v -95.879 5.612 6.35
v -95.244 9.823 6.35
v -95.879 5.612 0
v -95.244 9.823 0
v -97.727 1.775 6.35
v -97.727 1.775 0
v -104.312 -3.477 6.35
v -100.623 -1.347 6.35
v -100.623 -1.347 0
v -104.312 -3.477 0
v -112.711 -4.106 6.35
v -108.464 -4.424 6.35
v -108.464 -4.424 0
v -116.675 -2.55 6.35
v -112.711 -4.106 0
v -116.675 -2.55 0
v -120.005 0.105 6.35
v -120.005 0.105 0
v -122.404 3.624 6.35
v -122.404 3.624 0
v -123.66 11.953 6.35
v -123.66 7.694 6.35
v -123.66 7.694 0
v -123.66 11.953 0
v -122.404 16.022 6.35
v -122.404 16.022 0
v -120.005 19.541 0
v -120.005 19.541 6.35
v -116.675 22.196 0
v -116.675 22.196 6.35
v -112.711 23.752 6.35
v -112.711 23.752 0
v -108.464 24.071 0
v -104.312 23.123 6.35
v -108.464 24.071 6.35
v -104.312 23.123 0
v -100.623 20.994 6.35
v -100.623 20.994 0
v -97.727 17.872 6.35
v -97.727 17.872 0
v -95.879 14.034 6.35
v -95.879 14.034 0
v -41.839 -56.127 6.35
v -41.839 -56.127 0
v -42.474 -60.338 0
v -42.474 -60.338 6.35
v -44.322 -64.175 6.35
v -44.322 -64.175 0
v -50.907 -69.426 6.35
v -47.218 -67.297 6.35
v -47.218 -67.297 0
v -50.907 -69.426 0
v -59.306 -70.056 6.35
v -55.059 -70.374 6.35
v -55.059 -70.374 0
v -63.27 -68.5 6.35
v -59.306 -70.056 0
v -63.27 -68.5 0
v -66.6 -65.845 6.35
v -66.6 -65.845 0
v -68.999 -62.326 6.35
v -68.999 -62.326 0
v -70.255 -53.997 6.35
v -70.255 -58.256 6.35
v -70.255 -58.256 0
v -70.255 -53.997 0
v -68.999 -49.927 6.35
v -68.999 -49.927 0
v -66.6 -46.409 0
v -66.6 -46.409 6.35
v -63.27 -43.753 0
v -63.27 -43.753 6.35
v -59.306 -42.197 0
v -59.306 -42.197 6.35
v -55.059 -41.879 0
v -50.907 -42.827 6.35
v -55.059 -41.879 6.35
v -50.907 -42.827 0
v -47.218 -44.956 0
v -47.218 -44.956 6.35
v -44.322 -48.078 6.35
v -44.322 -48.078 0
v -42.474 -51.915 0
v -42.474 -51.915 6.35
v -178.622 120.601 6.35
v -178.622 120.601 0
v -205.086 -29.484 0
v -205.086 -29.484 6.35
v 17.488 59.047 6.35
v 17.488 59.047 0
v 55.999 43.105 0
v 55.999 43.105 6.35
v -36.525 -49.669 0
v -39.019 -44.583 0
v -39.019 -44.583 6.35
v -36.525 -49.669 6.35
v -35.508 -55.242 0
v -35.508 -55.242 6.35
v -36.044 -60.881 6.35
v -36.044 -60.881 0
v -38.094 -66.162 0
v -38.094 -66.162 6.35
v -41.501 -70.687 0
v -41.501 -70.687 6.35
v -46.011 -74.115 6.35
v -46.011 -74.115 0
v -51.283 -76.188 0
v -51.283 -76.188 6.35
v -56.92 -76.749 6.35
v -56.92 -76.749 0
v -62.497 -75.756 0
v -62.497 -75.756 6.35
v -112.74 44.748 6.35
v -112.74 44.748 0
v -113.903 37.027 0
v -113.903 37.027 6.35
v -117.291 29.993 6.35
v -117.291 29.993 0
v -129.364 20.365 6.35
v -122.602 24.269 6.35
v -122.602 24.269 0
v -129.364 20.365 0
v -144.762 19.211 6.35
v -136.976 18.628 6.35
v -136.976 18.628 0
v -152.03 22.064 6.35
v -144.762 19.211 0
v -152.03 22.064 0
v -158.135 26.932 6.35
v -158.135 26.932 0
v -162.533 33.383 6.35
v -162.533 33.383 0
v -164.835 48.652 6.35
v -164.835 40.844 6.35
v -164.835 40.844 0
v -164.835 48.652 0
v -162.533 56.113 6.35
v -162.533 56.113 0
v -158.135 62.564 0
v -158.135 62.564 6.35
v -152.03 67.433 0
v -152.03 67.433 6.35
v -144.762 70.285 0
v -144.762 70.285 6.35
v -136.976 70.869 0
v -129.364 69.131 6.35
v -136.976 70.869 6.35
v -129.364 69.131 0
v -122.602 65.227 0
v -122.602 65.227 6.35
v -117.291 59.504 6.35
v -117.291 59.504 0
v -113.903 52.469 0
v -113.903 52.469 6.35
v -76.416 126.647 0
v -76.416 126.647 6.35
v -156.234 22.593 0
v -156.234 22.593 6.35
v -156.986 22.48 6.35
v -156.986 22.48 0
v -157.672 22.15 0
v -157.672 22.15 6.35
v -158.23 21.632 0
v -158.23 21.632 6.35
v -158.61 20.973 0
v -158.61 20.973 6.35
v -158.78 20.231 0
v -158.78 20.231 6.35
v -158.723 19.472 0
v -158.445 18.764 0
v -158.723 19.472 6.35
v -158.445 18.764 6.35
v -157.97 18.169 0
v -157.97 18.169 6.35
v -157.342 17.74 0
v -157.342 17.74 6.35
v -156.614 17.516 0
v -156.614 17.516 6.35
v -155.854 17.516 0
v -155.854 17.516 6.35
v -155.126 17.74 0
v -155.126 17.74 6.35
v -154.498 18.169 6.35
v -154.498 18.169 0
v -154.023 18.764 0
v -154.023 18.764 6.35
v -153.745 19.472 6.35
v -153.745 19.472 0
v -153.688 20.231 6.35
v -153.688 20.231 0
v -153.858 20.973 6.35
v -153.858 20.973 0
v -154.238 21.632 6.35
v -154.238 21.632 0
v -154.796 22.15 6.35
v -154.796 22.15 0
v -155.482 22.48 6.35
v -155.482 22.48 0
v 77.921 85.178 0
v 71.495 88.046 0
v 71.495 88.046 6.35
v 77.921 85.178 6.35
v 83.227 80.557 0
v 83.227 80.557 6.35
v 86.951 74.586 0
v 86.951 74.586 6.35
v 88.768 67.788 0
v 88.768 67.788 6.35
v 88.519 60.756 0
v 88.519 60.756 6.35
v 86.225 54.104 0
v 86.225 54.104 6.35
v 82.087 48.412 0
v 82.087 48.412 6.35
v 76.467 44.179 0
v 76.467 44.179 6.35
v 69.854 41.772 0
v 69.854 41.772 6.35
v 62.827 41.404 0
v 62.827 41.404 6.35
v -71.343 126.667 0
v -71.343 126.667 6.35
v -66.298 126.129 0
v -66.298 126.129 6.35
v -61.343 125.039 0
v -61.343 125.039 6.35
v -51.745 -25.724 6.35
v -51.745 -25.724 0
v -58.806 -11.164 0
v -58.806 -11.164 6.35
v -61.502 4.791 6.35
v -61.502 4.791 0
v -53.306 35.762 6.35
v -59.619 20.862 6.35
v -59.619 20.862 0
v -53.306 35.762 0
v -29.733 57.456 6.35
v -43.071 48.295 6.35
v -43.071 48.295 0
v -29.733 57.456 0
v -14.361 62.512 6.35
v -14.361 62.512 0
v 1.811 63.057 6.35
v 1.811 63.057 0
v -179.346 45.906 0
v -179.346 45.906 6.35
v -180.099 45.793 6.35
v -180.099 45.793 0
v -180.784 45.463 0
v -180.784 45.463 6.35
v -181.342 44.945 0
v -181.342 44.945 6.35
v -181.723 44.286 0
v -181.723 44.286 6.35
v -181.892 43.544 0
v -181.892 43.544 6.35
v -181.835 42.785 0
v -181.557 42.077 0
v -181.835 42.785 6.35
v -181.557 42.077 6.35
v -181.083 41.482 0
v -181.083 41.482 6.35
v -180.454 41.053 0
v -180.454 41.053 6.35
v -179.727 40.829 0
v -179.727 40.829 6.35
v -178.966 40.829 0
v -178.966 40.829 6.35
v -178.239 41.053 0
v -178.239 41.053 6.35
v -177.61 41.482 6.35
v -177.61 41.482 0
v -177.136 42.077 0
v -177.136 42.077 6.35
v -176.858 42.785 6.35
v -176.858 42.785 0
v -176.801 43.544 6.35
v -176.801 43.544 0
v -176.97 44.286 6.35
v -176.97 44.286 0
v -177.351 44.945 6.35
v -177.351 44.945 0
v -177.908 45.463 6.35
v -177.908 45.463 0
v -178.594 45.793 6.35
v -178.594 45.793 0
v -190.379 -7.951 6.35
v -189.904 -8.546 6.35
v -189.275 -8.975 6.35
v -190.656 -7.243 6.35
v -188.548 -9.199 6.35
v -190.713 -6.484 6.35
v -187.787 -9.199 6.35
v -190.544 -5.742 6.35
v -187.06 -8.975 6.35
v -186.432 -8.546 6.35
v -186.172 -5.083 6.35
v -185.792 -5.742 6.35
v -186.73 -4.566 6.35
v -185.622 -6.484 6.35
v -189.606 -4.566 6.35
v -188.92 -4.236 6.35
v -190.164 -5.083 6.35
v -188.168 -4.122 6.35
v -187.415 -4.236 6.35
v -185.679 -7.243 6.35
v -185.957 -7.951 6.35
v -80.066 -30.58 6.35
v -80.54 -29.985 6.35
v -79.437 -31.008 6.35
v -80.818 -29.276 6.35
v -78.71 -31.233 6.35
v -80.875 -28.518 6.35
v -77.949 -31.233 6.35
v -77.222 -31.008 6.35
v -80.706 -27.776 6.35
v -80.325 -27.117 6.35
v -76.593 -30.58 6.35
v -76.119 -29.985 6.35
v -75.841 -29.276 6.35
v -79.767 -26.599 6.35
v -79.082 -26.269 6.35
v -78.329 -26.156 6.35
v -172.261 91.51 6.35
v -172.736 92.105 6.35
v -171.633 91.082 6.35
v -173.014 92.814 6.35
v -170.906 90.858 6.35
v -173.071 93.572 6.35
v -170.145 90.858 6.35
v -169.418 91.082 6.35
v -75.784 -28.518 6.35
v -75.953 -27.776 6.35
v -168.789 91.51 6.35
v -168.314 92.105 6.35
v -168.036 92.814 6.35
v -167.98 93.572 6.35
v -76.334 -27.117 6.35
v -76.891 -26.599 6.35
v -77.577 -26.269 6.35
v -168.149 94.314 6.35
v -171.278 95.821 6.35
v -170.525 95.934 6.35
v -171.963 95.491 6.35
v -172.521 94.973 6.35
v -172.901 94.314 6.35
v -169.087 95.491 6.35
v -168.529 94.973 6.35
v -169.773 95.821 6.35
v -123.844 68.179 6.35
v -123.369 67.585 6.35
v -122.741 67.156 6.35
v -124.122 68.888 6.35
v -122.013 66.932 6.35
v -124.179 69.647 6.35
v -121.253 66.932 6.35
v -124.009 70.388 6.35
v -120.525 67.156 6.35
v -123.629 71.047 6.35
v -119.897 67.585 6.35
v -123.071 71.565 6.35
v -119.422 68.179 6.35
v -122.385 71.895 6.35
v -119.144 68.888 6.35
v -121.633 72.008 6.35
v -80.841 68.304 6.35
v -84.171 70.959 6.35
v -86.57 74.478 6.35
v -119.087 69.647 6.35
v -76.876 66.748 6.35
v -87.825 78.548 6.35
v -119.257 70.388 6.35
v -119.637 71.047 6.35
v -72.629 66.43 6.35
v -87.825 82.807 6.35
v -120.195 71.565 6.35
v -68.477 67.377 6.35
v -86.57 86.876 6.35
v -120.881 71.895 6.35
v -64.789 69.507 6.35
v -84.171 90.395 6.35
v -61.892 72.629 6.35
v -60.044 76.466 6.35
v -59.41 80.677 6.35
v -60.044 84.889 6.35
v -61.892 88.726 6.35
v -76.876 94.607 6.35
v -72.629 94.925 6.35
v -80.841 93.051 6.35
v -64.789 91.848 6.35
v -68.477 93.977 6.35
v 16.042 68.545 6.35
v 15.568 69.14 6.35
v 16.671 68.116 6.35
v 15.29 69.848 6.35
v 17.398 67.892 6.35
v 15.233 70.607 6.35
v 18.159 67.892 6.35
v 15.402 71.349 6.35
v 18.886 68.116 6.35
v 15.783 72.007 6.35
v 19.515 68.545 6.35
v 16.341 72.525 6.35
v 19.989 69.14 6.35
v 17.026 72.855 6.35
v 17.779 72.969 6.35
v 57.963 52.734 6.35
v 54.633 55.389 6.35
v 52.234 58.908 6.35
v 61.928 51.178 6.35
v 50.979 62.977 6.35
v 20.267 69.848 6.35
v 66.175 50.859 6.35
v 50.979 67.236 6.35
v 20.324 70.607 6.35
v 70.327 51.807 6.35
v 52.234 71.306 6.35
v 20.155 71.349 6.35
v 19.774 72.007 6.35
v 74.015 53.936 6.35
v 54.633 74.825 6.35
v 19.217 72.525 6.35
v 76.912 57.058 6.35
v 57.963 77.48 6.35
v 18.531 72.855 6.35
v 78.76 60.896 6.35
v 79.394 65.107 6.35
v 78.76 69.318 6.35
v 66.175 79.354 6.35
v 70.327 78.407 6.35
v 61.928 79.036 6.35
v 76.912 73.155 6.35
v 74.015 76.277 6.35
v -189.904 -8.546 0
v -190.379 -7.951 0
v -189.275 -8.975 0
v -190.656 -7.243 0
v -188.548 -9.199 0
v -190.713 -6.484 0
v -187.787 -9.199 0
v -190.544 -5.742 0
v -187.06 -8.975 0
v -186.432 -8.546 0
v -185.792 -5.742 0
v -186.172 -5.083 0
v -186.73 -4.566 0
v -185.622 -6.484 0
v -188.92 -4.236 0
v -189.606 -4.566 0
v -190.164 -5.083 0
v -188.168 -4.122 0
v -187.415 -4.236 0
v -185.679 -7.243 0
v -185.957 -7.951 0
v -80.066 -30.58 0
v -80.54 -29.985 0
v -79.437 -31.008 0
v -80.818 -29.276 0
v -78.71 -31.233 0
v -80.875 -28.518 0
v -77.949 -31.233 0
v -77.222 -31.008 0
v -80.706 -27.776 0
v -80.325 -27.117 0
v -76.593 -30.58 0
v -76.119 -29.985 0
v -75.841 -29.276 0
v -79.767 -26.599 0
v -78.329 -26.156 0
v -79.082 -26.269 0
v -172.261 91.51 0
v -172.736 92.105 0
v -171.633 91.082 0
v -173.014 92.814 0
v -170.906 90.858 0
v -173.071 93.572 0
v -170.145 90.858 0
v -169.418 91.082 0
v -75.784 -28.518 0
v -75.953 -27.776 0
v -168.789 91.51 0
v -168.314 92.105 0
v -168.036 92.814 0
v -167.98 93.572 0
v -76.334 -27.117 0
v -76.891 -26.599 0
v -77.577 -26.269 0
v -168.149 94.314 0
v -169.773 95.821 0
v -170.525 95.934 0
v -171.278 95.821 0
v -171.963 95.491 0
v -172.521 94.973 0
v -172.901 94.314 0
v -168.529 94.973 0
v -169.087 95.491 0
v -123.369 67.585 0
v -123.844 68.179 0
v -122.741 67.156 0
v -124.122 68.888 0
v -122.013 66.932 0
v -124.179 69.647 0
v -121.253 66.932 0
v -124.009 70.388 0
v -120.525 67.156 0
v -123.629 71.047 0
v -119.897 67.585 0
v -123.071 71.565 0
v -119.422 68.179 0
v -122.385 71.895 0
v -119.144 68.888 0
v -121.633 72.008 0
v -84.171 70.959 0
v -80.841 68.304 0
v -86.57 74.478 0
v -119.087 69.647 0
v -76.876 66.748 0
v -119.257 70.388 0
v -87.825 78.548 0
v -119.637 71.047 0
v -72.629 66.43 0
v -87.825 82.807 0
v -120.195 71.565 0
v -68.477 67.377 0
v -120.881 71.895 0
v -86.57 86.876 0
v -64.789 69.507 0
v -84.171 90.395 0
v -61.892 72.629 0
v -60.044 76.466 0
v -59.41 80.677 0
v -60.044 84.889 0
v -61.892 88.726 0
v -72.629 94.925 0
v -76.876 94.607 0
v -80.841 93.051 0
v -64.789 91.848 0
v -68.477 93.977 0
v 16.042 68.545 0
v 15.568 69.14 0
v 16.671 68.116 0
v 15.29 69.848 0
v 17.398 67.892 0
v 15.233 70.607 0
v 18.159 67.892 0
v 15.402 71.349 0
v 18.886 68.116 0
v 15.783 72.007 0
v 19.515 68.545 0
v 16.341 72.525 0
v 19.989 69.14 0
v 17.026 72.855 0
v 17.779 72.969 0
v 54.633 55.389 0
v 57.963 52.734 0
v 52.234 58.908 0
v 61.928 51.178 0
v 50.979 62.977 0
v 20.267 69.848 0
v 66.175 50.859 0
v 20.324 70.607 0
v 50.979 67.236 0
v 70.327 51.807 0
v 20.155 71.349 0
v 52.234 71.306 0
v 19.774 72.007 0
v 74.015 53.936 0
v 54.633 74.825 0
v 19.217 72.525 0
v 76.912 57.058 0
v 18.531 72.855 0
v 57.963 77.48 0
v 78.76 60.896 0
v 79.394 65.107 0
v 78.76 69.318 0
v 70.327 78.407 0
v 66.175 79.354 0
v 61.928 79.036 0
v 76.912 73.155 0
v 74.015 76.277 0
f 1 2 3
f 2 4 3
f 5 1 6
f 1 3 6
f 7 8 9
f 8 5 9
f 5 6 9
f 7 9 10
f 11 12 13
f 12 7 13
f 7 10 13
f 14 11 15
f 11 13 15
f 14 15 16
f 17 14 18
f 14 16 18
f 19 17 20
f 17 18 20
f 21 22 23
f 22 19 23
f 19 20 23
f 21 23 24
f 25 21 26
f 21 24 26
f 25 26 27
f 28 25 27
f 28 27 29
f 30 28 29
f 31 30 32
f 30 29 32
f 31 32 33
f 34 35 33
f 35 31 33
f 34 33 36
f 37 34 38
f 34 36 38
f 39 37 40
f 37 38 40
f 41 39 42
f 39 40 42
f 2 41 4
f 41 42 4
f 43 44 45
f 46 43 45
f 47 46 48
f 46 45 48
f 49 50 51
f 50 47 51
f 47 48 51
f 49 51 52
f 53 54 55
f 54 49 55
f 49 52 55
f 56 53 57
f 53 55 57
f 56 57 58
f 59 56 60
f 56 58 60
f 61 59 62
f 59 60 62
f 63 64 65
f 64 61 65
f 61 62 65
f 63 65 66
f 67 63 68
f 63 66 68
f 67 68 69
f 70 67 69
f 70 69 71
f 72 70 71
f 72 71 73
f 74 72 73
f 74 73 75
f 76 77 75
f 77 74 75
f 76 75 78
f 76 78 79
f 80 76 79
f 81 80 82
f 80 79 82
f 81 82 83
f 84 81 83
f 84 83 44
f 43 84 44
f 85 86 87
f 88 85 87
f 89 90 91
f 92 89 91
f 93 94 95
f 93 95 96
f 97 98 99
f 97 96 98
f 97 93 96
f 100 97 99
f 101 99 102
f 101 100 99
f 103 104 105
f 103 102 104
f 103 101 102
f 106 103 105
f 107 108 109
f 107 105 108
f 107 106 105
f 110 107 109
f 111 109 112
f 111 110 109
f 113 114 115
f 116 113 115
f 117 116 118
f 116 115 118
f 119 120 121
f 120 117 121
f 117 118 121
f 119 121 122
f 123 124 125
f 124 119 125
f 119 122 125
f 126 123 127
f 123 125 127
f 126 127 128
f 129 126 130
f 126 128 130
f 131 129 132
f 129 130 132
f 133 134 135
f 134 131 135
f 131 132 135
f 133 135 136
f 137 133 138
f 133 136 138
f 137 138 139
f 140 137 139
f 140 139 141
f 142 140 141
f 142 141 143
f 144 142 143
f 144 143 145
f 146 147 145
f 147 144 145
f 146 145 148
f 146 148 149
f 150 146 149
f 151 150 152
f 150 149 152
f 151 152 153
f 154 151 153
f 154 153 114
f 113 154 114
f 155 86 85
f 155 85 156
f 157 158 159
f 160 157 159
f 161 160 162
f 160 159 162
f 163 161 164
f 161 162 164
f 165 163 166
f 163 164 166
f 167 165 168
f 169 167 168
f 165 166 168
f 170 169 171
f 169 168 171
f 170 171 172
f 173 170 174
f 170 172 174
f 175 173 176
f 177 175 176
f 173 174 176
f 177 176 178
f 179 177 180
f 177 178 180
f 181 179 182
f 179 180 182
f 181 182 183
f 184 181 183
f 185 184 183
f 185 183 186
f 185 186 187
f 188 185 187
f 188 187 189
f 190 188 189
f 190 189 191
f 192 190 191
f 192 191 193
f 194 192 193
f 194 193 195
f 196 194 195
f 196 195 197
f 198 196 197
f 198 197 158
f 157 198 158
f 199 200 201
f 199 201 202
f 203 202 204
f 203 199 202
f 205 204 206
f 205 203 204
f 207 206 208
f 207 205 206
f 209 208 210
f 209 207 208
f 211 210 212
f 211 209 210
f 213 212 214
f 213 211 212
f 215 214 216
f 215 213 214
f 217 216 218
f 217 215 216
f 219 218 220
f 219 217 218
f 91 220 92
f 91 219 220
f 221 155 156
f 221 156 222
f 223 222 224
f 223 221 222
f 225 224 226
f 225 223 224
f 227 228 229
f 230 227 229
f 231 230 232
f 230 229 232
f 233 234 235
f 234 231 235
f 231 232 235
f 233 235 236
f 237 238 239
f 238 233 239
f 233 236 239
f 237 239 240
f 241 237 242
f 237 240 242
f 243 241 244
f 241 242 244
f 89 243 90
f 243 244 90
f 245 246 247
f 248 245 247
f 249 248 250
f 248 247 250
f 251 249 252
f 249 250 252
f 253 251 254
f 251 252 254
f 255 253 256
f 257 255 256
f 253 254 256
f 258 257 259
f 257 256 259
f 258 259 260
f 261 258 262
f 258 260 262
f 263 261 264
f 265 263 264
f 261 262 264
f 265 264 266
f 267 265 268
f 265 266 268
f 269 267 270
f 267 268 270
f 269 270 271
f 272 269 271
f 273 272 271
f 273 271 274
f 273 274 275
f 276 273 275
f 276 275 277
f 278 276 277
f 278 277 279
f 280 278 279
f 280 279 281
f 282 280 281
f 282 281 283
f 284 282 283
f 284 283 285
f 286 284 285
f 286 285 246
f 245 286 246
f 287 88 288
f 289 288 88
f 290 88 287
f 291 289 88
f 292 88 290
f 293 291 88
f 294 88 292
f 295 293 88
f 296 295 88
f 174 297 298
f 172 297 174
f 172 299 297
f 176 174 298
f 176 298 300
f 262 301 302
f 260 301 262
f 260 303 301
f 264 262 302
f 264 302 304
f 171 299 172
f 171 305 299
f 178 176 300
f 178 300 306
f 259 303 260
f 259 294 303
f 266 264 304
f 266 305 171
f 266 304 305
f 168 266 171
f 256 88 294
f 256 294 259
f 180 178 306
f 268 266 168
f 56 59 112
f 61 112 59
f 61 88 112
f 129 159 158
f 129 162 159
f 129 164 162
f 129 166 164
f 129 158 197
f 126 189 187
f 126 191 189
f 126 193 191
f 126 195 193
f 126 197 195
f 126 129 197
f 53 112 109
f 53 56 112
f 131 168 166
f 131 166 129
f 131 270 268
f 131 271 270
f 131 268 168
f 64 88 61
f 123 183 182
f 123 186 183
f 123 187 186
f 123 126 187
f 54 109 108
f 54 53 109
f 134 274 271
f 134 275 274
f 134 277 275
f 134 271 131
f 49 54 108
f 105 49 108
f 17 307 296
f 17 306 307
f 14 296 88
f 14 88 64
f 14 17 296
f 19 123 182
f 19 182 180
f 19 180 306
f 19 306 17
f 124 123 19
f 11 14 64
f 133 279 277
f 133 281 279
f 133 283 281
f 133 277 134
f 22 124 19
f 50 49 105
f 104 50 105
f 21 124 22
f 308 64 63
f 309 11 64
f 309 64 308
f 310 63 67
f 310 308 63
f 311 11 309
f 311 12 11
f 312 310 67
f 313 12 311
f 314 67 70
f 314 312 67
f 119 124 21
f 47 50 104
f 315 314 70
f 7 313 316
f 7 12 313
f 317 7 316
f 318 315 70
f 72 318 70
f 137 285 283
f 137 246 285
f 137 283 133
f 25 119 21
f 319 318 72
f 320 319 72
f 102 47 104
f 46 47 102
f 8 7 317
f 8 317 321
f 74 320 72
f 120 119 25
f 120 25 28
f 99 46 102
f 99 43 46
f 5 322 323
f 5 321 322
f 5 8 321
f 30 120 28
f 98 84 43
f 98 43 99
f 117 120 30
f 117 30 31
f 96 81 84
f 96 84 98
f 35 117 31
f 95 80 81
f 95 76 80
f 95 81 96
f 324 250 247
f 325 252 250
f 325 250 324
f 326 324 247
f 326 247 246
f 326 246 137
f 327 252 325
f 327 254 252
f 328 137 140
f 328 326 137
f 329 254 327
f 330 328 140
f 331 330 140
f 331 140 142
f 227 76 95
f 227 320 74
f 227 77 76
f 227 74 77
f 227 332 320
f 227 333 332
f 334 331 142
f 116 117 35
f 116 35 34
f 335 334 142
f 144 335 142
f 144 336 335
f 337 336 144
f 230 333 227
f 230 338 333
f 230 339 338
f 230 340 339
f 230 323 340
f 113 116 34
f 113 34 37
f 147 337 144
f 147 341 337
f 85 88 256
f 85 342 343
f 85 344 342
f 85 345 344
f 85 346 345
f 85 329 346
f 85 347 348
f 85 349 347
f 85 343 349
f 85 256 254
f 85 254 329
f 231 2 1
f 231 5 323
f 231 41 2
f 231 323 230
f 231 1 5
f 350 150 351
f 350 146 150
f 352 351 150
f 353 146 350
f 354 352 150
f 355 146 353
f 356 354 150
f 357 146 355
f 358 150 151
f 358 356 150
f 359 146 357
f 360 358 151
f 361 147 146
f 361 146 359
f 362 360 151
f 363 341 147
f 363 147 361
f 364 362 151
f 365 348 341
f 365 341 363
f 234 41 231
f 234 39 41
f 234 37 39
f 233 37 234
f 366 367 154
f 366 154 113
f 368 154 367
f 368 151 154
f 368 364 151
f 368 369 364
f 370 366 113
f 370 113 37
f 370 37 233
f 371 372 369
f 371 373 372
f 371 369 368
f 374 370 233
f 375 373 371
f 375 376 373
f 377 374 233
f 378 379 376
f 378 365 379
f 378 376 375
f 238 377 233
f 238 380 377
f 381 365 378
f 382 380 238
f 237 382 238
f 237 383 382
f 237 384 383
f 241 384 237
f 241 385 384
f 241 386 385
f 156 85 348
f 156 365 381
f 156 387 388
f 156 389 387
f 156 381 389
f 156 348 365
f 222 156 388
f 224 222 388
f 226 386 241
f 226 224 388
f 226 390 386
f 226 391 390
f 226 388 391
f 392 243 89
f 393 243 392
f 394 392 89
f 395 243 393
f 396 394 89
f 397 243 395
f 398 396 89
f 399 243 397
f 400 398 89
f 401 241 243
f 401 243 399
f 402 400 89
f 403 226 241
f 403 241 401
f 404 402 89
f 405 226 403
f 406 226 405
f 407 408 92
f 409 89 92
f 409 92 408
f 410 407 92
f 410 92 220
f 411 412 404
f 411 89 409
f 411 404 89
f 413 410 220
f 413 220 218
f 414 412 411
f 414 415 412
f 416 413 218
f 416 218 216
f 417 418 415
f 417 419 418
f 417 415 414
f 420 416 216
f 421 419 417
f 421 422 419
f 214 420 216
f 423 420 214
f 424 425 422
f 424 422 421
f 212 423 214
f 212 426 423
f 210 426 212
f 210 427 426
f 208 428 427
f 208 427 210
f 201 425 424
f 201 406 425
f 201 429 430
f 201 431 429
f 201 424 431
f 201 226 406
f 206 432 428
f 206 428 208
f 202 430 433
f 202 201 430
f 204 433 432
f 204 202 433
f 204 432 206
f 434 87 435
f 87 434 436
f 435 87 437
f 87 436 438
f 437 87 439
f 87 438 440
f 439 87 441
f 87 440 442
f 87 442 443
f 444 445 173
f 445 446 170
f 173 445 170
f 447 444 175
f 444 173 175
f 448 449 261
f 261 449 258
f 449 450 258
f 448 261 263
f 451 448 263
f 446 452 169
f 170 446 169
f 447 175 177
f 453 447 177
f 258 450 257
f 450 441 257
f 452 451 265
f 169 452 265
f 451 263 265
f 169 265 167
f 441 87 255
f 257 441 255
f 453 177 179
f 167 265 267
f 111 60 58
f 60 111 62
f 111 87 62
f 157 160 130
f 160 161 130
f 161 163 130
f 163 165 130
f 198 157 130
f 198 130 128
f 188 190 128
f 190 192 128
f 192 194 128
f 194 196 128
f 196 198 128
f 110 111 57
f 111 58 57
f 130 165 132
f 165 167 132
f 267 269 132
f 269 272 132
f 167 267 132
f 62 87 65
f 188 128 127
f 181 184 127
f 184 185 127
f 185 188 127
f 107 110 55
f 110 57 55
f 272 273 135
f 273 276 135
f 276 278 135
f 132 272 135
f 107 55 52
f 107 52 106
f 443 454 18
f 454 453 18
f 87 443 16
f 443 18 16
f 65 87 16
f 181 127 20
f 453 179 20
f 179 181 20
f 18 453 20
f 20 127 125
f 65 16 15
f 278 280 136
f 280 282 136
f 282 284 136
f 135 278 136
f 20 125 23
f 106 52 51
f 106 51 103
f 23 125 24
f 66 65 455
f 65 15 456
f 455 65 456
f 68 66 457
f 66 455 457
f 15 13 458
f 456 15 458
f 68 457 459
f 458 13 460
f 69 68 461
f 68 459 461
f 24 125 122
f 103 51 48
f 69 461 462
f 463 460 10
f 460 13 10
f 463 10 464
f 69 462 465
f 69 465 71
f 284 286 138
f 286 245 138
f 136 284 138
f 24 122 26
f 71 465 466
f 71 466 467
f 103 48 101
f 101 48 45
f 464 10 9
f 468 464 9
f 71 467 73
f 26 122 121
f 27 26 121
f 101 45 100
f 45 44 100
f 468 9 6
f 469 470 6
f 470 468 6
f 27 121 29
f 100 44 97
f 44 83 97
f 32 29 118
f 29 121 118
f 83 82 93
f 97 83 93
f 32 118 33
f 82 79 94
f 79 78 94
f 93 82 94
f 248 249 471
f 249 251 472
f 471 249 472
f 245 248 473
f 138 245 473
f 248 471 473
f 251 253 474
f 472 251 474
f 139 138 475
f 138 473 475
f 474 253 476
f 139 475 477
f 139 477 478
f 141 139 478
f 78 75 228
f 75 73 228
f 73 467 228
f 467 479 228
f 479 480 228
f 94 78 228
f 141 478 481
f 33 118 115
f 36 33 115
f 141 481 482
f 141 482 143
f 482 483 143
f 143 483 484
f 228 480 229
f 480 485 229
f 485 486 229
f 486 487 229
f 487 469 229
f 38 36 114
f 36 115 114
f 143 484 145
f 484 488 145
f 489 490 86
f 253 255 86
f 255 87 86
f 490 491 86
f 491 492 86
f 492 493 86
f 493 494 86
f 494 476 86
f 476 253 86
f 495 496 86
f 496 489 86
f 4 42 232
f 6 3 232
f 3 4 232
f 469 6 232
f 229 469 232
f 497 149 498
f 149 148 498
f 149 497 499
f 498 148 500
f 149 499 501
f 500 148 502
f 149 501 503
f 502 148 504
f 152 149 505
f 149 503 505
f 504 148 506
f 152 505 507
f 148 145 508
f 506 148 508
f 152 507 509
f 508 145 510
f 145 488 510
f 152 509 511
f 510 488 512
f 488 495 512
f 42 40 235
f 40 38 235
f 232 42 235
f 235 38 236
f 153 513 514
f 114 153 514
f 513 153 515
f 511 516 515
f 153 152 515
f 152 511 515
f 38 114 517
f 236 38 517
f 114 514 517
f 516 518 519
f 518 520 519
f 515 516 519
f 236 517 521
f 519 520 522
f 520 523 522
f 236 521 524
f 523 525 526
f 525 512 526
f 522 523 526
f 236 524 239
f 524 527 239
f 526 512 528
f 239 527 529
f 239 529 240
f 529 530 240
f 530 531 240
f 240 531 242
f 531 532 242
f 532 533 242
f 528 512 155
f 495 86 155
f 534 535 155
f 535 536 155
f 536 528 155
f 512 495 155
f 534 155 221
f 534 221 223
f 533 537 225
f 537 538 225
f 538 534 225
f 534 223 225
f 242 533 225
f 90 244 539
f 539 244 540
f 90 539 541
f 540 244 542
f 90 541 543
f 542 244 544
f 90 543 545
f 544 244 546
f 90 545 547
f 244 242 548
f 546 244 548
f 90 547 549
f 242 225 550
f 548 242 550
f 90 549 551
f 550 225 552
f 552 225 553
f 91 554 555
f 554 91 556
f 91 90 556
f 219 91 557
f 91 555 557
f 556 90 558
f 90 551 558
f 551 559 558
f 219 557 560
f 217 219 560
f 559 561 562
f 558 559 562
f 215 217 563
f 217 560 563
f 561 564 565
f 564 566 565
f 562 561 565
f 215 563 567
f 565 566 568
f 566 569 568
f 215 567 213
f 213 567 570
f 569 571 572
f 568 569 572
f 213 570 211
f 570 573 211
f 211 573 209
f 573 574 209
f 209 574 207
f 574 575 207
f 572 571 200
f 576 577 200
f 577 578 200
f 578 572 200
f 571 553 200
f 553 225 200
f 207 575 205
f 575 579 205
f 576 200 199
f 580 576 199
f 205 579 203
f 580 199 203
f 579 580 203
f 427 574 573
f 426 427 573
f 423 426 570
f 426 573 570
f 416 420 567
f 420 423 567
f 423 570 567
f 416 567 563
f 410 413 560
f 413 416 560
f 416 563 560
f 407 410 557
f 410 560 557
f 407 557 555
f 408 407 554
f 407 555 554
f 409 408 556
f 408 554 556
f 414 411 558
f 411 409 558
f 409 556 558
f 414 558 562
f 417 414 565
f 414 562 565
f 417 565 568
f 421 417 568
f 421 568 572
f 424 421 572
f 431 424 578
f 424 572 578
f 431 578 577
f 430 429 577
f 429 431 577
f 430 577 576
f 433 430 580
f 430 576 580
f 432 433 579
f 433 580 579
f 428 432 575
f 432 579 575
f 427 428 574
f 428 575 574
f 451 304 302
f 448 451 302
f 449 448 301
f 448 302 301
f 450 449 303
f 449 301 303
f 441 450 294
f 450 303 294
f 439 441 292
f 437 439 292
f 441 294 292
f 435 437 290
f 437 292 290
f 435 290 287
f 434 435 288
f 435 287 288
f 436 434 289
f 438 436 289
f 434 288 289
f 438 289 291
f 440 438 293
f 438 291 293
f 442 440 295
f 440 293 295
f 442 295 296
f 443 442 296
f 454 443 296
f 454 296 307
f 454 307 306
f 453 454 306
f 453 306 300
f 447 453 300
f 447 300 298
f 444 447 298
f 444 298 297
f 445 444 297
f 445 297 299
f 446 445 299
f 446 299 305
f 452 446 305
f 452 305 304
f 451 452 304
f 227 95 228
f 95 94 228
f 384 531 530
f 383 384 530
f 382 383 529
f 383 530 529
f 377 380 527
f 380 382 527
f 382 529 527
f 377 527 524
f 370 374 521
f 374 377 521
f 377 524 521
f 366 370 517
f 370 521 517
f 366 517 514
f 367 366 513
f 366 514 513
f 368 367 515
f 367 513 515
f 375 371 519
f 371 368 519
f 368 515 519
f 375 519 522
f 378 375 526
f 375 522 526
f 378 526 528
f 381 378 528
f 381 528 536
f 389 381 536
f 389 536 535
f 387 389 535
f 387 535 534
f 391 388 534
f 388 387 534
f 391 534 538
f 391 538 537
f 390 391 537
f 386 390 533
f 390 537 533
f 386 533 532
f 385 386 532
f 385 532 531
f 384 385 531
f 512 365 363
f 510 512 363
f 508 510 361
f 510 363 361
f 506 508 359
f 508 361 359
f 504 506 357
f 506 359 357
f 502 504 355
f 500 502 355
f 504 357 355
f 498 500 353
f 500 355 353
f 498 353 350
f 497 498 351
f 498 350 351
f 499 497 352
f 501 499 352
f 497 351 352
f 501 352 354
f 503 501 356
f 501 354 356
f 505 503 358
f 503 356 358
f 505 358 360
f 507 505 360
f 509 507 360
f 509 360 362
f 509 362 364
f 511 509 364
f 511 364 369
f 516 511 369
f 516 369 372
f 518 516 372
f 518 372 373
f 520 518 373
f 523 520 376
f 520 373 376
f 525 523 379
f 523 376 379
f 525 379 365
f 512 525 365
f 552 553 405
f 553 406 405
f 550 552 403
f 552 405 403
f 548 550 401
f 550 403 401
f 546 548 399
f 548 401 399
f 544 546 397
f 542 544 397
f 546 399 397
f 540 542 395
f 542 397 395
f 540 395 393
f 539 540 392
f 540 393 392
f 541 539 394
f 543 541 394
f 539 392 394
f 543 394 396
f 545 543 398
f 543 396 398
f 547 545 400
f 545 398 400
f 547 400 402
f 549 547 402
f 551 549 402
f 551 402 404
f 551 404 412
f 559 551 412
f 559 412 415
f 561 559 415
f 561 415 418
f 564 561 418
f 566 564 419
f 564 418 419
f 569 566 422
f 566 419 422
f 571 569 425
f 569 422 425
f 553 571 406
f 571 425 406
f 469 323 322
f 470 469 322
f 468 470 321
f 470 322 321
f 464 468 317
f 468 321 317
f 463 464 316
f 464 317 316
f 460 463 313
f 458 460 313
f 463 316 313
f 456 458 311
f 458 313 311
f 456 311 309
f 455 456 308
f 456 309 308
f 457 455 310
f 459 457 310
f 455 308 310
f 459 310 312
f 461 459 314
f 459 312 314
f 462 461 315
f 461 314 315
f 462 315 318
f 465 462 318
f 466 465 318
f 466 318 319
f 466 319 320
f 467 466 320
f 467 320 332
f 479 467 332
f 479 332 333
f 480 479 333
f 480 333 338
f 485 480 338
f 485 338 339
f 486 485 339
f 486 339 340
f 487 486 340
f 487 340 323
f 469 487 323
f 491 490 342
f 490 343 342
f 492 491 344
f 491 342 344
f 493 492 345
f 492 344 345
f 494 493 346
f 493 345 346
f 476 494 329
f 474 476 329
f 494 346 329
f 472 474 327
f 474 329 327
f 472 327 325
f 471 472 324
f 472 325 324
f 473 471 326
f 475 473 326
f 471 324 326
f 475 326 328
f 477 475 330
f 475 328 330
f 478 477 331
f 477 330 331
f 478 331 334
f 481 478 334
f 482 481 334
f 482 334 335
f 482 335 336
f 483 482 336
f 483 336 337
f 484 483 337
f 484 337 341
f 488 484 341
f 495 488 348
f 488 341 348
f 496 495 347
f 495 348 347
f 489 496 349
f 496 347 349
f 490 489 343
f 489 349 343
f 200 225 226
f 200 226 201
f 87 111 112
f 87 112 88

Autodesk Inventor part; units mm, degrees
ref_plane "YZ Plane" through (0, 0, 0) normal (1, 0, 0) x (0, 1, 0)
ref_plane "XZ Plane" through (0, 0, 0) normal (0, 1, 0) x (-1, 0, 0)
ref_plane "XY Plane" through (0, 0, 0) normal (0, 0, 1) x (1, 0, 0)
sketch "Sketch1" plane through (0, 0, 0) normal (0, 0, 1) x (1, 0, 0)
  circle A0 centre (65.1069, 65.1069) radius 38.1 construction
  circle A1 centre (-56.1266, -56.1266) radius 25.4 construction
  circle A2 centre (0, 0) radius 53.975 construction
  line L0 (-38.1661, -38.1661) -> (38.1661, 38.1661) construction
  line L1 (65.1069, 65.1069) -> (-56.1266, -56.1266) construction
  line L2 (-4.3707, 6.2419) -> (-4.3707, 53.7978) construction
  line L3 (-213.7812, -81.5266) -> (651.6109, -81.5266) construction
  circle A3 centre (160.9392, -24.3766) radius 57.15 construction
  circle A4 centre (65.1069, 65.1069) radius 14.2875
  circle A5 centre (-56.1266, -56.1266) radius 14.2875
  circle A6 centre (-4.3707, 6.2419) radius 57.15 construction
  circle A7 centre (-56.1266, -56.1266) radius 20.6375 construction
  circle A8 centre (65.1069, 65.1069) radius 23.8125 construction
  circle A9 centre (-73.6972, 80.6773) radius 14.2875
  line L4 (-73.6972, 80.6773) -> (65.1069, 65.1069) construction
  circle A10 centre (65.1069, 65.1069) radius 14.3256 construction
  circle A11 centre (-56.1266, -56.1266) radius 14.3256 construction
  circle A12 centre (-109.5316, 9.8231) radius 14.2875
  line L5 (-56.1266, -56.1266) -> (-109.5316, 9.8231) construction
  circle A13 centre (-109.5316, 9.8231) radius 39.7002 construction
  circle A14 centre (-73.6972, 80.6773) radius 39.7002 construction
  line L6 (17.4877, 59.0466) -> (55.9992, 43.1049)
  line L7 (-39.0193, -44.5834) -> (-51.7448, -25.7239)
  arc A15 (17.4877, 59.0466) -> (-51.7448, -25.7239) centre (-4.3707, 6.2419) ccw
  line L8 (-178.6215, 120.6011) -> (-153.6074, 116.1905) construction
  line L9 (-153.6074, 116.1905) -> (-180.0714, -33.8943) construction
  line L10 (-180.0714, -33.8943) -> (-205.0855, -29.4836) construction
  line L11 (-205.0855, -29.4836) -> (-178.6215, 120.6011) construction
  line L12 (-209.5607, -54.8639) -> (48.3188, -100.335) construction
  line L13 (-174.1463, 145.9814) -> (151.5491, 88.5525) construction
  line L14 (-174.1463, 145.9814) -> (-209.5607, -54.8639) construction
  circle A16 centre (-138.9335, 44.7481) radius 25.4 construction
  circle A17 centre (-138.9335, 44.7481) radius 5.9531 construction
  line L15 (-84.5475, -21.0298) -> (-72.1113, -36.3871) construction
  circle A18 centre (17.7787, 70.4159) radius 9.525 construction
  line L16 (-166.1144, 118.3958) -> (-192.5784, -31.6889) construction
  line L17 (-170.5251, 93.3817) -> (-188.1678, -6.6748) construction
  circle A19 centre (-138.9335, 44.7481) radius 17.4625 construction
  circle A20 centre (-138.9335, 44.7481) radius 9.525 construction
  circle A21 centre (-73.6972, 80.6773) radius 46.0502 construction
  line L18 (-178.6215, 120.6011) -> (-76.4165, 126.6471)
  line L19 (-61.3431, 125.0394) -> (71.4951, 88.0465)
  line L20 (-62.4968, -75.7563) -> (-205.0855, -29.4836)
  line L21 (-178.6215, 120.6011) -> (-205.0855, -29.4836)
  arc A22 (-61.3431, 125.0394) -> (-76.4165, 126.6471) centre (-73.6972, 80.6773) ccw
  arc A23 (55.9992, 43.1049) -> (71.4951, 88.0465) centre (65.1069, 65.1069) ccw
  arc A24 (-62.4968, -75.7563) -> (-39.0193, -44.5834) centre (-56.1266, -56.1266) ccw
  line L22 (-138.9335, 44.7481) -> (-128.9174, 59.0525) construction
  line L23 (-121.633, 69.4558) -> (-156.234, 20.0404) construction
  circle A25 centre (-156.234, 20.0404) radius 4.7625 construction
  line L24 (-4.3707, 6.2419) -> (0, 0) construction
  circle A26 centre (-73.6972, 80.6773) radius 40.4812 construction
  circle A27 centre (-109.5316, 9.8231) radius 40.4812 construction
  circle A28 centre (-138.9335, 44.7481) radius 26.1938
  point P0 (-191.8535, 45.5588)
  point P1 (-78.3294, -28.7084)
  point P2 (-179.3464, 43.3534)
  point P3 (-179.3464, 43.3534)
  point P4 (-146.3135, 60.5745)
  point P5 (-156.3295, 46.2701)
  point P6 (-148.9496, 30.4437)
  point P7 (-131.5535, 28.9217)
  point P8 (-121.5374, 43.2261)
  point P9 (-63.3695, 121.1474)
  dimension "d7" = 50.8
  dimension "d18" = 79.4004
  dimension "d34" = 34.925
  dimension "d3" = 45
  dimension "d4" = 0
  dimension "d8" = 107.95
  dimension "d9" = 28.575
  dimension "d10" = 76.2
  dimension "d11" = 114.3
  dimension "d12" = 114.3
  dimension "d13" = 6.35
  dimension "d14" = 9.525
  dimension "d15" = 139.6746
  dimension "d16" = 28.6512
  dimension "d17" = 84.8614
  dimension "d19" = 79.4004
  dimension "d22" = 25.4
  dimension "d23" = 152.4
  dimension "d26" = 203.9436
  dimension "d27" = 50.8
  dimension "d28" = 11.9062
  dimension "d29" = 51
  dimension "d30" = 171.45
  dimension "d31" = 10
  dimension "d32" = 19.05
  dimension "d33" = 101.6
  dimension "d35" = 19.05
  dimension "d36" = 6.35
  dimension "d37" = 34.925
  dimension "d40" = 360
  dimension "d43" = 25
  dimension "d44" = 9.525
  dimension "d54" = 7.62
  dimension "d55" = 80
  dimension "d57" = 80.9625
  dimension "d59" = 0.7937
extrude "Extrusion1" add sketch "Sketch1" along normal blind 6.35
hole "Hole1" at (-78.3294, -28.7084, 0) at (17.7787, 70.4159, 0) at (-170.5251, 93.3817, 0) at (-179.3464, 43.3534, 0) at (-188.1678, -6.6748, 0) at (-128.9174, 59.0525, 0) at (-146.3135, 60.5745, 0) at (-156.3295, 46.2701, 0) at (-148.9496, 30.4437, 0) at (-131.5535, 28.9217, 0) at (-121.5374, 43.2261, 0) at (-121.633, 69.4558, 0) at (-156.234, 20.0404, 0) direction (0, 0, 1) diameter 5.1054 end through all clearance for "Flat Head Machine Screw (82)" size "#10" standard "Ansi Unified Screw Threads"
properties part number "GP7-002" material "Polycarbonate, Smoke"
